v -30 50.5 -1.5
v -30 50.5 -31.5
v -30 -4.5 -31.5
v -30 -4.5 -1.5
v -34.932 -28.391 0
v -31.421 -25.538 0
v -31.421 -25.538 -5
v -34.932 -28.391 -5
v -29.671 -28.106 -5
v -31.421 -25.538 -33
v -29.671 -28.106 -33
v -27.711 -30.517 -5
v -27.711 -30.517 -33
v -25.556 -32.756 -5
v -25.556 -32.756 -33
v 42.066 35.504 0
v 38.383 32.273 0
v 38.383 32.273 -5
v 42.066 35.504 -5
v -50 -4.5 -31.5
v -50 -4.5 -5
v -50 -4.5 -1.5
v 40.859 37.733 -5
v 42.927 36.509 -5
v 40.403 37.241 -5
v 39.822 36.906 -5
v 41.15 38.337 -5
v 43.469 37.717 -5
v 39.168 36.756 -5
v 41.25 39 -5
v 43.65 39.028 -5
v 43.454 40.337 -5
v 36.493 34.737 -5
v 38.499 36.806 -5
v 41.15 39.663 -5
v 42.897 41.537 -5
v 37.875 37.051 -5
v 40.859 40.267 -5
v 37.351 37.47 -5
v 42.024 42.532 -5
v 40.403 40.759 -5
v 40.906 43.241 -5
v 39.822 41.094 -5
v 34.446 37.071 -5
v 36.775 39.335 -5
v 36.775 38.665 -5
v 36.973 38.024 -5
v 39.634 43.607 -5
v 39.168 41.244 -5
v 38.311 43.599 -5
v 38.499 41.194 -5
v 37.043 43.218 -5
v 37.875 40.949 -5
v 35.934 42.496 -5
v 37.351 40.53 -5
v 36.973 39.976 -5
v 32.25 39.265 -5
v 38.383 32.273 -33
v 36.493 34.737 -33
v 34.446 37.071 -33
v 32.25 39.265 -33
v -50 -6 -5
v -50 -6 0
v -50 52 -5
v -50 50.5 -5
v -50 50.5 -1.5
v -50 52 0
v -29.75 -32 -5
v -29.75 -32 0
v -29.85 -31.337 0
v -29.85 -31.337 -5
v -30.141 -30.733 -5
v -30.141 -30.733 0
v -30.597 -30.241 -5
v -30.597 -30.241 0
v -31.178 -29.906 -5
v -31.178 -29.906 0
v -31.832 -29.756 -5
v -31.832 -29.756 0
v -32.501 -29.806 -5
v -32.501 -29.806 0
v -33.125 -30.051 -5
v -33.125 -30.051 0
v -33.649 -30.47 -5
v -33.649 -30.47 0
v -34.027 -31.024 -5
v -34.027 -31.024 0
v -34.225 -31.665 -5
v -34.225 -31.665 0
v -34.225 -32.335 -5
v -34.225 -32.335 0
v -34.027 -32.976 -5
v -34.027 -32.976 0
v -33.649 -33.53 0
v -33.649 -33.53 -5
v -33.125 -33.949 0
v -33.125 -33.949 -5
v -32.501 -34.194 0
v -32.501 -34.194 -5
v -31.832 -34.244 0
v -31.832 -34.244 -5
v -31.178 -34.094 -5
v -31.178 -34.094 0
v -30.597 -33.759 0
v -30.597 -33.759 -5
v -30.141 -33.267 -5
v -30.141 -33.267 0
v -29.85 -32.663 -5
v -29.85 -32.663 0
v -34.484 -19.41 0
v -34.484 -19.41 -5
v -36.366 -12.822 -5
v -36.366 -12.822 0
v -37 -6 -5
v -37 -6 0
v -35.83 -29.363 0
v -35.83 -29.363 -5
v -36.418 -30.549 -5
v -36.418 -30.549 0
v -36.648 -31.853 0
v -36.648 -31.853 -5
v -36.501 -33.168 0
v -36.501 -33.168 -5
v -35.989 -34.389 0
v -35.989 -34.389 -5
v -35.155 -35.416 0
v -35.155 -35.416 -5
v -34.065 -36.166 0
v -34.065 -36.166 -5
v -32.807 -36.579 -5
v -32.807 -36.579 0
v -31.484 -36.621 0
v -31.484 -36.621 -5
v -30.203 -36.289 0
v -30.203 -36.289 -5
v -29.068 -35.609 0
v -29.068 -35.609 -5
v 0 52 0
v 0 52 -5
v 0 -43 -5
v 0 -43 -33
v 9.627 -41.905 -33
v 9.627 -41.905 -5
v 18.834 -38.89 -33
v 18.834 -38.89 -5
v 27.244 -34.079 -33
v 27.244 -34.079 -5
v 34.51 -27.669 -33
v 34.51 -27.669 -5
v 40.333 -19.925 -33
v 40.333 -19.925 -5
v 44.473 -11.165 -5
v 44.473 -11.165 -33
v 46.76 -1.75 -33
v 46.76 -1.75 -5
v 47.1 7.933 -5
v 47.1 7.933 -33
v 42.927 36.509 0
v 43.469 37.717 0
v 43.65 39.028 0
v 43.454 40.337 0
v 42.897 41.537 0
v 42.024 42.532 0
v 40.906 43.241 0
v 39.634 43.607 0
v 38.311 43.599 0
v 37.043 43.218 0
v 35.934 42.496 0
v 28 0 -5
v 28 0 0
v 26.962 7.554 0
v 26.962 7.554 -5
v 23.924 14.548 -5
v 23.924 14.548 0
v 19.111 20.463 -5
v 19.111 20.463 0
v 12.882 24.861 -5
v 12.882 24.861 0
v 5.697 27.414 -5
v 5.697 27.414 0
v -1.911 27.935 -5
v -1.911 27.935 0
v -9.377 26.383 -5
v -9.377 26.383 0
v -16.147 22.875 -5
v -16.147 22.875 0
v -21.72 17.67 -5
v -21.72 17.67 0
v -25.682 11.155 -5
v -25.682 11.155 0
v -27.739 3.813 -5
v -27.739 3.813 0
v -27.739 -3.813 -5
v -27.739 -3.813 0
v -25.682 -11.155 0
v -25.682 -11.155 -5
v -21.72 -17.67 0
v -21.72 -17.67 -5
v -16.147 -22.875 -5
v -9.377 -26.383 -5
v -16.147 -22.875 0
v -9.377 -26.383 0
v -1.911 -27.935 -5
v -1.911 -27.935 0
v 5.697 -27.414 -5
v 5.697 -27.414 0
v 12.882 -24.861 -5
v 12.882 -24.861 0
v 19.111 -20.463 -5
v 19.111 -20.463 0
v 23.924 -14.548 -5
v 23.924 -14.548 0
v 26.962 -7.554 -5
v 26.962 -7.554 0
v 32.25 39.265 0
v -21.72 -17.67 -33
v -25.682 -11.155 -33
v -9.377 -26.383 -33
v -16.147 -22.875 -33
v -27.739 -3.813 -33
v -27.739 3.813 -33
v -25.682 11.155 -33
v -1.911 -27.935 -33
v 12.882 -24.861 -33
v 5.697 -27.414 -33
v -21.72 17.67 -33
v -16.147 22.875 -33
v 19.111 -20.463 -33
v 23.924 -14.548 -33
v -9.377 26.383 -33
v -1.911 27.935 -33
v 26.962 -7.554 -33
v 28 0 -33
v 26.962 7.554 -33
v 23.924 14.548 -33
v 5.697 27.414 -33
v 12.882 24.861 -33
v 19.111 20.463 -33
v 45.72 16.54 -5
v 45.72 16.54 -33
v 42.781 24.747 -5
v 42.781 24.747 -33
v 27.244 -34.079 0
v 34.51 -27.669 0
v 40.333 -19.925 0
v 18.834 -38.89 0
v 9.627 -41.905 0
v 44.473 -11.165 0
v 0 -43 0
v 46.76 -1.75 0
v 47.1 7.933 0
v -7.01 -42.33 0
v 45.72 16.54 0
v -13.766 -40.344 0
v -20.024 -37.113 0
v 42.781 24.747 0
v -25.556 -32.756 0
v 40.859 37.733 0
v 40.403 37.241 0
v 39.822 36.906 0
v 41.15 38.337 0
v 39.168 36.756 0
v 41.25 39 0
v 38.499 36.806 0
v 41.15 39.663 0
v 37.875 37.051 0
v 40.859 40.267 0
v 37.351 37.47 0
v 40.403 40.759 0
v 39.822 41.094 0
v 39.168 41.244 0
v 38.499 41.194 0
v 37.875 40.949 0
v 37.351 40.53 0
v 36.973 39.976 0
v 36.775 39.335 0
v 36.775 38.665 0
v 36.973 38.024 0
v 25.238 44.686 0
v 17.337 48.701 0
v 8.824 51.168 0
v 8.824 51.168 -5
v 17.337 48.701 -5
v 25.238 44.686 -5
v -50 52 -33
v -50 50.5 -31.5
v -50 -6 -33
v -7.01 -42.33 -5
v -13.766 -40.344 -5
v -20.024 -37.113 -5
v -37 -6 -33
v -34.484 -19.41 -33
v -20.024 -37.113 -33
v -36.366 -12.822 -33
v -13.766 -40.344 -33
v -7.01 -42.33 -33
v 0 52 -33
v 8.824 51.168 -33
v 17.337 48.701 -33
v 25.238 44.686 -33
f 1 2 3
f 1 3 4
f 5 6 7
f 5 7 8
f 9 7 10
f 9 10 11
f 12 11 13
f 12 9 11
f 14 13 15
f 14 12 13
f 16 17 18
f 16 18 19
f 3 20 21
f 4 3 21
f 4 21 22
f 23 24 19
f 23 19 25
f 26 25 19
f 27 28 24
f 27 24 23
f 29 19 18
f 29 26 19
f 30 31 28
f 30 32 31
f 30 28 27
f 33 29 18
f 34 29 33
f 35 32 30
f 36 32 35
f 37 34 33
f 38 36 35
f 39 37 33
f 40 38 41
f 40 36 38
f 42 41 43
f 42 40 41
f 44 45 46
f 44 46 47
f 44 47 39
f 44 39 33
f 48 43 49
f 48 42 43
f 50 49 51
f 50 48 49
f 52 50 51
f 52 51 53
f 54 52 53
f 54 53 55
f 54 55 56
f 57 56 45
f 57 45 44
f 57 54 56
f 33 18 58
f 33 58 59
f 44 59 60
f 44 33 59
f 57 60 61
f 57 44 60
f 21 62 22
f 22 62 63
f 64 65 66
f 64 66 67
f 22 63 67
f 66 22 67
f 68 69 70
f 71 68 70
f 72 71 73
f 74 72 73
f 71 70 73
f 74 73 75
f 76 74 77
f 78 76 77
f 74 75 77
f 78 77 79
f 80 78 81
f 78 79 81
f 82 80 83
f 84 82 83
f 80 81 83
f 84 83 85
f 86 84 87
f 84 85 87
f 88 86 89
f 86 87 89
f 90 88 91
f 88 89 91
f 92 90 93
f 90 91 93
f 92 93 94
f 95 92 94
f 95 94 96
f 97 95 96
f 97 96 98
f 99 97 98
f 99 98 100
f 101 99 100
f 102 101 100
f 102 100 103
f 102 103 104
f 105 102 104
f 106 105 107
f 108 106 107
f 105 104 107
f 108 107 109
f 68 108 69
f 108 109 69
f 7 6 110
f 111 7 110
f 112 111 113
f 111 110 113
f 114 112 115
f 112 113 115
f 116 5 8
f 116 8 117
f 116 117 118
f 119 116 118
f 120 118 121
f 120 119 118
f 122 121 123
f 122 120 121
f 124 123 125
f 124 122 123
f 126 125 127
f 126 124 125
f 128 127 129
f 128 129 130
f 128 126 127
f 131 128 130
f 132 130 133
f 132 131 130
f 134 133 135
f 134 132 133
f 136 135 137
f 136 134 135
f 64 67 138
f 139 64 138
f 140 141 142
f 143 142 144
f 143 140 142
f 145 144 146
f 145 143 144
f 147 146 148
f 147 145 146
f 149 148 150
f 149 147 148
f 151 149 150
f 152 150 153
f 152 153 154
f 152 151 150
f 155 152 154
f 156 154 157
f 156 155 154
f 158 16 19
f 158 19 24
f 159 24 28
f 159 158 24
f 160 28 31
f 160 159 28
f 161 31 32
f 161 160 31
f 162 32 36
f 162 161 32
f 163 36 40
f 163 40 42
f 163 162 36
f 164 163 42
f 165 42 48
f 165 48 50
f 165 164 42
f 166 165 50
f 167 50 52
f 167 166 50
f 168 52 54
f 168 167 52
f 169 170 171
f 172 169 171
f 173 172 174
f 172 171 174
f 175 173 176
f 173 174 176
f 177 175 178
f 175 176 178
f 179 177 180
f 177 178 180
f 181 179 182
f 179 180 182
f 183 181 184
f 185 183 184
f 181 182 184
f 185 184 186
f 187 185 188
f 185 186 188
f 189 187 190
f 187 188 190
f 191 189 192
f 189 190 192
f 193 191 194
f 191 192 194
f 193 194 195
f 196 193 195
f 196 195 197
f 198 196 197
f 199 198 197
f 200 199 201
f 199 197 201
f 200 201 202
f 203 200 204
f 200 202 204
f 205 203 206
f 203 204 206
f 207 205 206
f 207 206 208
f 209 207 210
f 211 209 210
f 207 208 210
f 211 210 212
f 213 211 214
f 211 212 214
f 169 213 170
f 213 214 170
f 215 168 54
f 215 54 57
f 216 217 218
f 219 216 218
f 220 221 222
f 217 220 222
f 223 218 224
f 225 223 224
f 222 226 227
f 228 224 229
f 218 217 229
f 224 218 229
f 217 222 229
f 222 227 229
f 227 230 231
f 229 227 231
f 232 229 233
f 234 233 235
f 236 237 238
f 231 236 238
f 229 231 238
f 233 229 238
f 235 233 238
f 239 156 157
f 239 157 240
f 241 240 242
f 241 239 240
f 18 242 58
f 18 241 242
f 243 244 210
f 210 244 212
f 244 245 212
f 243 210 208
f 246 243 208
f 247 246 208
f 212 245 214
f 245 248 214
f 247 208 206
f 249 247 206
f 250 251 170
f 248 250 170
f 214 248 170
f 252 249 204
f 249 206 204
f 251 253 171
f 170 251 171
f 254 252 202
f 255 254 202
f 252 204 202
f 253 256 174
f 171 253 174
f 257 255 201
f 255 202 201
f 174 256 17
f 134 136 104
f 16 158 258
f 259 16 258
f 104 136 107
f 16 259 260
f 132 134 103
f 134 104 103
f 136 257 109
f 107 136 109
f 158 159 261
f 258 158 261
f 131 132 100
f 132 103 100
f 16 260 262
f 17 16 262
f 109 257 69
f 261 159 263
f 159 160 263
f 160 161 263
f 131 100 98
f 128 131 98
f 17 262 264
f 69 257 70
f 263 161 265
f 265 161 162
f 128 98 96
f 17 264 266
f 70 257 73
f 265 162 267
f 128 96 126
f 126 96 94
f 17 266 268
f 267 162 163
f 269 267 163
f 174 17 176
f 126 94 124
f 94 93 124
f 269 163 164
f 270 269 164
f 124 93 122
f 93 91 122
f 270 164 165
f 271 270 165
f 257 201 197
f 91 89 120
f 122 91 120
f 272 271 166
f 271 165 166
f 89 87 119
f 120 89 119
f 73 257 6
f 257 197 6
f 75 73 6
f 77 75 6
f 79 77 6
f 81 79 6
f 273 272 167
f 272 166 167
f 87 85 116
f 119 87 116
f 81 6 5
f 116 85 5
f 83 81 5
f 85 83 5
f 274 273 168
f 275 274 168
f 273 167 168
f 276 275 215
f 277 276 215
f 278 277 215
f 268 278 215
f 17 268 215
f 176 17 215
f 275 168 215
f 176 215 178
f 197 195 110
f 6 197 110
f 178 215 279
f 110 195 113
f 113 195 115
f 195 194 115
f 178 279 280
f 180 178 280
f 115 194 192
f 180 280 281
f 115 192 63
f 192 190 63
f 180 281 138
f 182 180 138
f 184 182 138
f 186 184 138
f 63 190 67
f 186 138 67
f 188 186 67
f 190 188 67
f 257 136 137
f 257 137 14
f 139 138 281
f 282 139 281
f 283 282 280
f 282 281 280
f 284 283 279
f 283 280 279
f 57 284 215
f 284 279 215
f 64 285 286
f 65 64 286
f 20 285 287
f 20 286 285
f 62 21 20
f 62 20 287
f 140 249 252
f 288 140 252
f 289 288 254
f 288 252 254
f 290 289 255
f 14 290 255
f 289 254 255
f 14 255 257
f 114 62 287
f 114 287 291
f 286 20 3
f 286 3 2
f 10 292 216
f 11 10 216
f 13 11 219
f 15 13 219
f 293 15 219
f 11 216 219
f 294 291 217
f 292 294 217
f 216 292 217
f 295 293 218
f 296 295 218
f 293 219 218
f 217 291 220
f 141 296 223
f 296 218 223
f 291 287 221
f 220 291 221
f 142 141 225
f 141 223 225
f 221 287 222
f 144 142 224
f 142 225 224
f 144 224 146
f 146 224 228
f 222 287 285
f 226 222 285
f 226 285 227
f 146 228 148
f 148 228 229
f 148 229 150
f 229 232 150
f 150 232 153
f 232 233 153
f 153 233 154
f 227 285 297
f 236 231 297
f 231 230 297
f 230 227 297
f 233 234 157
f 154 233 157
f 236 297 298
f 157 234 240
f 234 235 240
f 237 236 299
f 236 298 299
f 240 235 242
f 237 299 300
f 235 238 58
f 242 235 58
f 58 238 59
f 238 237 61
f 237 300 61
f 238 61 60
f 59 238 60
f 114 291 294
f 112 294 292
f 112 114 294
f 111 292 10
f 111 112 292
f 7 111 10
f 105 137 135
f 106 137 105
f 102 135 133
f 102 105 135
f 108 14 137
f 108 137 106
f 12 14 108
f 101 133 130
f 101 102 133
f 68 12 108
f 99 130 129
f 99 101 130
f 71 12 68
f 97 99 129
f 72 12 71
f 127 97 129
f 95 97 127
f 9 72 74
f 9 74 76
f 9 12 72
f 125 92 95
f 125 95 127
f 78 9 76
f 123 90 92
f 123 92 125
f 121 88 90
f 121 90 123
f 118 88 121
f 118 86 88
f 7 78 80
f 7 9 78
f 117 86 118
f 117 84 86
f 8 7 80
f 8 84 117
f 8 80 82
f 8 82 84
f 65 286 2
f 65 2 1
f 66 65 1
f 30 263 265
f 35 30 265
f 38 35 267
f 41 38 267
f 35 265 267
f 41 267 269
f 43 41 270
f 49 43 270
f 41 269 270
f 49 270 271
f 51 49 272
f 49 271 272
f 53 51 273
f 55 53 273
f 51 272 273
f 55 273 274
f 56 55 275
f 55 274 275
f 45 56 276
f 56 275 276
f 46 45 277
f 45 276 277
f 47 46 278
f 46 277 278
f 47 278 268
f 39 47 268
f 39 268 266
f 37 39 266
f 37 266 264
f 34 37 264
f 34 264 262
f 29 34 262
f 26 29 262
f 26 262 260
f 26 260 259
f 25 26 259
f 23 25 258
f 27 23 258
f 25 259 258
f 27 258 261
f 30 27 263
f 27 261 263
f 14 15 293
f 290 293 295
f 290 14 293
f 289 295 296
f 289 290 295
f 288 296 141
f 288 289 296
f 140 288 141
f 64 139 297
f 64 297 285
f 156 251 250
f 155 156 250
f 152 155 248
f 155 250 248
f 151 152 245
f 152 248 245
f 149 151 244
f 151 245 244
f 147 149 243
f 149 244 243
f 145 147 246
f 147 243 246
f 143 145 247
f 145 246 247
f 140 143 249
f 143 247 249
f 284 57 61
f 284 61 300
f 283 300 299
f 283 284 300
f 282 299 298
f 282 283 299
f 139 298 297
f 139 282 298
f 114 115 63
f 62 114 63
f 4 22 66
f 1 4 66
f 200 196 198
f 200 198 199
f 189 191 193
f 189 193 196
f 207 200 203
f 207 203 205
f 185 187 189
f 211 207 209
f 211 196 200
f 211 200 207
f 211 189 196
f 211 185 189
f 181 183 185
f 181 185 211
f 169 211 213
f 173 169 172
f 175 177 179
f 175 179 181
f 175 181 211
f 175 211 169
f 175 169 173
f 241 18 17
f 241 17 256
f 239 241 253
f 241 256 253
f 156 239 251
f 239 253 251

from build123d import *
from build123d.topology import SkipClean

# Parameters (mm, degrees)
SKETCH2_R           = 2.25
SKETCH2_R_2         = 28
BOSS_EXTRUDE1_DEPTH = 5
SKETCH5_R           = 28
BOSS_EXTRUDE3_DEPTH = 28
SKETCH6_W           = 30
SKETCH6_H           = 55
CUT_EXTRUDE1_DEPTH  = 20


with BuildPart() as part:
    # Sketch2 → Boss-Extrude1 (new body)
    # profile 1 of 3: a face of its own
    with BuildSketch(Plane.XY):
        with BuildLine():
            Line((35.933927487, 42.495954711), (32.250401879, 39.26537607))
            ThreePointArc((32.250401879, 39.26537607), (35.489083713, 35.92080567), (38.382546905, 32.273466648))
            Line((38.382546905, 32.273466648), (42.066072513, 35.504045289))
            ThreePointArc((42.066072513, 35.504045289), (42.495954711, 42.066072513), (35.933927487, 42.495954711))
        make_face()
        with Locations((39, 39)):
            Circle(SKETCH2_R, mode=Mode.SUBTRACT)
    # profile 2 of 3: a face of its own
    with BuildSketch(Plane.XY):
        with BuildLine():
            ThreePointArc((-25.556282339, -32.755867263), (-28.716218004, -29.331927128), (-31.420793753, -25.538007062))
            Line((-31.420793753, -25.538007062), (-34.932255707, -28.391069899))
            ThreePointArc((-34.932255707, -28.391069899), (-35.608930101, -34.932255707), (-29.067744293, -35.608930101))
            Line((-29.067744293, -35.608930101), (-25.556282339, -32.755867263))
        make_face()
        with Locations((-32, -32)):
            Circle(SKETCH2_R, mode=Mode.SUBTRACT)
    # profile 3 of 3: a face of its own
    with BuildSketch(Plane.XY):
        with BuildLine():
            ThreePointArc((0, -43), (-26.162950904, -32.162950904), (-37, -6))
            Line((-37, -6), (-50, -6))
            Line((-50, -6), (-50, 52))
            Line((-50, 52), (0, 52))
            ThreePointArc((0, 52), (32.250401879, 39.26537607), (47.1, 7.932509882))
            ThreePointArc((47.1, 7.932509882), (34.50998509, -27.669026021), (0, -43))
        make_face()
        Circle(SKETCH2_R_2, mode=Mode.SUBTRACT)
    extrude(amount=-BOSS_EXTRUDE1_DEPTH)

    # Sketch5 → Boss-Extrude3 (add)
    # profile 1 of 2: a face of its own
    with SkipClean():  # the faces are left unmerged after this step: merging them gives an invalid solid
        with BuildSketch(Plane.XY.offset(-5)):
            with BuildLine():
                ThreePointArc((32.250401879, 39.26537607), (17.336803829, 48.701069191), (0, 52))
                Line((0, 52), (-50, 52))
                Line((-50, 52), (-50, -6))
                Line((-50, -6), (-37, -6))
                ThreePointArc((-37, -6), (-35.577867902, -16.159493864), (-31.420793753, -25.538007062))
                ThreePointArc((-31.420793753, -25.538007062), (-28.716218004, -29.331927128), (-25.556282339, -32.755867263))
                ThreePointArc((-25.556282339, -32.755867263), (-13.766497581, -40.34360995), (0, -43))
                ThreePointArc((0, -43), (34.50998509, -27.669026021), (47.1, 7.932509882))
                ThreePointArc((47.1, 7.932509882), (44.44026328, 20.711463284), (38.382546905, 32.273466648))
                ThreePointArc((38.382546905, 32.273466648), (35.489083713, 35.92080567), (32.250401879, 39.26537607))
            make_face()
            Circle(SKETCH5_R, mode=Mode.SUBTRACT)
        # profile 2 of 2: a face of its own
        with BuildSketch(Plane.XY.offset(-5)):
            Circle(SKETCH5_R)
        extrude(amount=-BOSS_EXTRUDE3_DEPTH)

    # Sketch6 → Cut-Extrude1 (cut)
    with SkipClean():  # the faces are left unmerged after this step: merging them gives an invalid solid
        with BuildSketch(Plane.ZY.offset(50)):
            with Locations((-16.5, 23)):
                Rectangle(SKETCH6_W, SKETCH6_H)
        extrude(amount=-CUT_EXTRUDE1_DEPTH, mode=Mode.SUBTRACT)


solid = part.part
